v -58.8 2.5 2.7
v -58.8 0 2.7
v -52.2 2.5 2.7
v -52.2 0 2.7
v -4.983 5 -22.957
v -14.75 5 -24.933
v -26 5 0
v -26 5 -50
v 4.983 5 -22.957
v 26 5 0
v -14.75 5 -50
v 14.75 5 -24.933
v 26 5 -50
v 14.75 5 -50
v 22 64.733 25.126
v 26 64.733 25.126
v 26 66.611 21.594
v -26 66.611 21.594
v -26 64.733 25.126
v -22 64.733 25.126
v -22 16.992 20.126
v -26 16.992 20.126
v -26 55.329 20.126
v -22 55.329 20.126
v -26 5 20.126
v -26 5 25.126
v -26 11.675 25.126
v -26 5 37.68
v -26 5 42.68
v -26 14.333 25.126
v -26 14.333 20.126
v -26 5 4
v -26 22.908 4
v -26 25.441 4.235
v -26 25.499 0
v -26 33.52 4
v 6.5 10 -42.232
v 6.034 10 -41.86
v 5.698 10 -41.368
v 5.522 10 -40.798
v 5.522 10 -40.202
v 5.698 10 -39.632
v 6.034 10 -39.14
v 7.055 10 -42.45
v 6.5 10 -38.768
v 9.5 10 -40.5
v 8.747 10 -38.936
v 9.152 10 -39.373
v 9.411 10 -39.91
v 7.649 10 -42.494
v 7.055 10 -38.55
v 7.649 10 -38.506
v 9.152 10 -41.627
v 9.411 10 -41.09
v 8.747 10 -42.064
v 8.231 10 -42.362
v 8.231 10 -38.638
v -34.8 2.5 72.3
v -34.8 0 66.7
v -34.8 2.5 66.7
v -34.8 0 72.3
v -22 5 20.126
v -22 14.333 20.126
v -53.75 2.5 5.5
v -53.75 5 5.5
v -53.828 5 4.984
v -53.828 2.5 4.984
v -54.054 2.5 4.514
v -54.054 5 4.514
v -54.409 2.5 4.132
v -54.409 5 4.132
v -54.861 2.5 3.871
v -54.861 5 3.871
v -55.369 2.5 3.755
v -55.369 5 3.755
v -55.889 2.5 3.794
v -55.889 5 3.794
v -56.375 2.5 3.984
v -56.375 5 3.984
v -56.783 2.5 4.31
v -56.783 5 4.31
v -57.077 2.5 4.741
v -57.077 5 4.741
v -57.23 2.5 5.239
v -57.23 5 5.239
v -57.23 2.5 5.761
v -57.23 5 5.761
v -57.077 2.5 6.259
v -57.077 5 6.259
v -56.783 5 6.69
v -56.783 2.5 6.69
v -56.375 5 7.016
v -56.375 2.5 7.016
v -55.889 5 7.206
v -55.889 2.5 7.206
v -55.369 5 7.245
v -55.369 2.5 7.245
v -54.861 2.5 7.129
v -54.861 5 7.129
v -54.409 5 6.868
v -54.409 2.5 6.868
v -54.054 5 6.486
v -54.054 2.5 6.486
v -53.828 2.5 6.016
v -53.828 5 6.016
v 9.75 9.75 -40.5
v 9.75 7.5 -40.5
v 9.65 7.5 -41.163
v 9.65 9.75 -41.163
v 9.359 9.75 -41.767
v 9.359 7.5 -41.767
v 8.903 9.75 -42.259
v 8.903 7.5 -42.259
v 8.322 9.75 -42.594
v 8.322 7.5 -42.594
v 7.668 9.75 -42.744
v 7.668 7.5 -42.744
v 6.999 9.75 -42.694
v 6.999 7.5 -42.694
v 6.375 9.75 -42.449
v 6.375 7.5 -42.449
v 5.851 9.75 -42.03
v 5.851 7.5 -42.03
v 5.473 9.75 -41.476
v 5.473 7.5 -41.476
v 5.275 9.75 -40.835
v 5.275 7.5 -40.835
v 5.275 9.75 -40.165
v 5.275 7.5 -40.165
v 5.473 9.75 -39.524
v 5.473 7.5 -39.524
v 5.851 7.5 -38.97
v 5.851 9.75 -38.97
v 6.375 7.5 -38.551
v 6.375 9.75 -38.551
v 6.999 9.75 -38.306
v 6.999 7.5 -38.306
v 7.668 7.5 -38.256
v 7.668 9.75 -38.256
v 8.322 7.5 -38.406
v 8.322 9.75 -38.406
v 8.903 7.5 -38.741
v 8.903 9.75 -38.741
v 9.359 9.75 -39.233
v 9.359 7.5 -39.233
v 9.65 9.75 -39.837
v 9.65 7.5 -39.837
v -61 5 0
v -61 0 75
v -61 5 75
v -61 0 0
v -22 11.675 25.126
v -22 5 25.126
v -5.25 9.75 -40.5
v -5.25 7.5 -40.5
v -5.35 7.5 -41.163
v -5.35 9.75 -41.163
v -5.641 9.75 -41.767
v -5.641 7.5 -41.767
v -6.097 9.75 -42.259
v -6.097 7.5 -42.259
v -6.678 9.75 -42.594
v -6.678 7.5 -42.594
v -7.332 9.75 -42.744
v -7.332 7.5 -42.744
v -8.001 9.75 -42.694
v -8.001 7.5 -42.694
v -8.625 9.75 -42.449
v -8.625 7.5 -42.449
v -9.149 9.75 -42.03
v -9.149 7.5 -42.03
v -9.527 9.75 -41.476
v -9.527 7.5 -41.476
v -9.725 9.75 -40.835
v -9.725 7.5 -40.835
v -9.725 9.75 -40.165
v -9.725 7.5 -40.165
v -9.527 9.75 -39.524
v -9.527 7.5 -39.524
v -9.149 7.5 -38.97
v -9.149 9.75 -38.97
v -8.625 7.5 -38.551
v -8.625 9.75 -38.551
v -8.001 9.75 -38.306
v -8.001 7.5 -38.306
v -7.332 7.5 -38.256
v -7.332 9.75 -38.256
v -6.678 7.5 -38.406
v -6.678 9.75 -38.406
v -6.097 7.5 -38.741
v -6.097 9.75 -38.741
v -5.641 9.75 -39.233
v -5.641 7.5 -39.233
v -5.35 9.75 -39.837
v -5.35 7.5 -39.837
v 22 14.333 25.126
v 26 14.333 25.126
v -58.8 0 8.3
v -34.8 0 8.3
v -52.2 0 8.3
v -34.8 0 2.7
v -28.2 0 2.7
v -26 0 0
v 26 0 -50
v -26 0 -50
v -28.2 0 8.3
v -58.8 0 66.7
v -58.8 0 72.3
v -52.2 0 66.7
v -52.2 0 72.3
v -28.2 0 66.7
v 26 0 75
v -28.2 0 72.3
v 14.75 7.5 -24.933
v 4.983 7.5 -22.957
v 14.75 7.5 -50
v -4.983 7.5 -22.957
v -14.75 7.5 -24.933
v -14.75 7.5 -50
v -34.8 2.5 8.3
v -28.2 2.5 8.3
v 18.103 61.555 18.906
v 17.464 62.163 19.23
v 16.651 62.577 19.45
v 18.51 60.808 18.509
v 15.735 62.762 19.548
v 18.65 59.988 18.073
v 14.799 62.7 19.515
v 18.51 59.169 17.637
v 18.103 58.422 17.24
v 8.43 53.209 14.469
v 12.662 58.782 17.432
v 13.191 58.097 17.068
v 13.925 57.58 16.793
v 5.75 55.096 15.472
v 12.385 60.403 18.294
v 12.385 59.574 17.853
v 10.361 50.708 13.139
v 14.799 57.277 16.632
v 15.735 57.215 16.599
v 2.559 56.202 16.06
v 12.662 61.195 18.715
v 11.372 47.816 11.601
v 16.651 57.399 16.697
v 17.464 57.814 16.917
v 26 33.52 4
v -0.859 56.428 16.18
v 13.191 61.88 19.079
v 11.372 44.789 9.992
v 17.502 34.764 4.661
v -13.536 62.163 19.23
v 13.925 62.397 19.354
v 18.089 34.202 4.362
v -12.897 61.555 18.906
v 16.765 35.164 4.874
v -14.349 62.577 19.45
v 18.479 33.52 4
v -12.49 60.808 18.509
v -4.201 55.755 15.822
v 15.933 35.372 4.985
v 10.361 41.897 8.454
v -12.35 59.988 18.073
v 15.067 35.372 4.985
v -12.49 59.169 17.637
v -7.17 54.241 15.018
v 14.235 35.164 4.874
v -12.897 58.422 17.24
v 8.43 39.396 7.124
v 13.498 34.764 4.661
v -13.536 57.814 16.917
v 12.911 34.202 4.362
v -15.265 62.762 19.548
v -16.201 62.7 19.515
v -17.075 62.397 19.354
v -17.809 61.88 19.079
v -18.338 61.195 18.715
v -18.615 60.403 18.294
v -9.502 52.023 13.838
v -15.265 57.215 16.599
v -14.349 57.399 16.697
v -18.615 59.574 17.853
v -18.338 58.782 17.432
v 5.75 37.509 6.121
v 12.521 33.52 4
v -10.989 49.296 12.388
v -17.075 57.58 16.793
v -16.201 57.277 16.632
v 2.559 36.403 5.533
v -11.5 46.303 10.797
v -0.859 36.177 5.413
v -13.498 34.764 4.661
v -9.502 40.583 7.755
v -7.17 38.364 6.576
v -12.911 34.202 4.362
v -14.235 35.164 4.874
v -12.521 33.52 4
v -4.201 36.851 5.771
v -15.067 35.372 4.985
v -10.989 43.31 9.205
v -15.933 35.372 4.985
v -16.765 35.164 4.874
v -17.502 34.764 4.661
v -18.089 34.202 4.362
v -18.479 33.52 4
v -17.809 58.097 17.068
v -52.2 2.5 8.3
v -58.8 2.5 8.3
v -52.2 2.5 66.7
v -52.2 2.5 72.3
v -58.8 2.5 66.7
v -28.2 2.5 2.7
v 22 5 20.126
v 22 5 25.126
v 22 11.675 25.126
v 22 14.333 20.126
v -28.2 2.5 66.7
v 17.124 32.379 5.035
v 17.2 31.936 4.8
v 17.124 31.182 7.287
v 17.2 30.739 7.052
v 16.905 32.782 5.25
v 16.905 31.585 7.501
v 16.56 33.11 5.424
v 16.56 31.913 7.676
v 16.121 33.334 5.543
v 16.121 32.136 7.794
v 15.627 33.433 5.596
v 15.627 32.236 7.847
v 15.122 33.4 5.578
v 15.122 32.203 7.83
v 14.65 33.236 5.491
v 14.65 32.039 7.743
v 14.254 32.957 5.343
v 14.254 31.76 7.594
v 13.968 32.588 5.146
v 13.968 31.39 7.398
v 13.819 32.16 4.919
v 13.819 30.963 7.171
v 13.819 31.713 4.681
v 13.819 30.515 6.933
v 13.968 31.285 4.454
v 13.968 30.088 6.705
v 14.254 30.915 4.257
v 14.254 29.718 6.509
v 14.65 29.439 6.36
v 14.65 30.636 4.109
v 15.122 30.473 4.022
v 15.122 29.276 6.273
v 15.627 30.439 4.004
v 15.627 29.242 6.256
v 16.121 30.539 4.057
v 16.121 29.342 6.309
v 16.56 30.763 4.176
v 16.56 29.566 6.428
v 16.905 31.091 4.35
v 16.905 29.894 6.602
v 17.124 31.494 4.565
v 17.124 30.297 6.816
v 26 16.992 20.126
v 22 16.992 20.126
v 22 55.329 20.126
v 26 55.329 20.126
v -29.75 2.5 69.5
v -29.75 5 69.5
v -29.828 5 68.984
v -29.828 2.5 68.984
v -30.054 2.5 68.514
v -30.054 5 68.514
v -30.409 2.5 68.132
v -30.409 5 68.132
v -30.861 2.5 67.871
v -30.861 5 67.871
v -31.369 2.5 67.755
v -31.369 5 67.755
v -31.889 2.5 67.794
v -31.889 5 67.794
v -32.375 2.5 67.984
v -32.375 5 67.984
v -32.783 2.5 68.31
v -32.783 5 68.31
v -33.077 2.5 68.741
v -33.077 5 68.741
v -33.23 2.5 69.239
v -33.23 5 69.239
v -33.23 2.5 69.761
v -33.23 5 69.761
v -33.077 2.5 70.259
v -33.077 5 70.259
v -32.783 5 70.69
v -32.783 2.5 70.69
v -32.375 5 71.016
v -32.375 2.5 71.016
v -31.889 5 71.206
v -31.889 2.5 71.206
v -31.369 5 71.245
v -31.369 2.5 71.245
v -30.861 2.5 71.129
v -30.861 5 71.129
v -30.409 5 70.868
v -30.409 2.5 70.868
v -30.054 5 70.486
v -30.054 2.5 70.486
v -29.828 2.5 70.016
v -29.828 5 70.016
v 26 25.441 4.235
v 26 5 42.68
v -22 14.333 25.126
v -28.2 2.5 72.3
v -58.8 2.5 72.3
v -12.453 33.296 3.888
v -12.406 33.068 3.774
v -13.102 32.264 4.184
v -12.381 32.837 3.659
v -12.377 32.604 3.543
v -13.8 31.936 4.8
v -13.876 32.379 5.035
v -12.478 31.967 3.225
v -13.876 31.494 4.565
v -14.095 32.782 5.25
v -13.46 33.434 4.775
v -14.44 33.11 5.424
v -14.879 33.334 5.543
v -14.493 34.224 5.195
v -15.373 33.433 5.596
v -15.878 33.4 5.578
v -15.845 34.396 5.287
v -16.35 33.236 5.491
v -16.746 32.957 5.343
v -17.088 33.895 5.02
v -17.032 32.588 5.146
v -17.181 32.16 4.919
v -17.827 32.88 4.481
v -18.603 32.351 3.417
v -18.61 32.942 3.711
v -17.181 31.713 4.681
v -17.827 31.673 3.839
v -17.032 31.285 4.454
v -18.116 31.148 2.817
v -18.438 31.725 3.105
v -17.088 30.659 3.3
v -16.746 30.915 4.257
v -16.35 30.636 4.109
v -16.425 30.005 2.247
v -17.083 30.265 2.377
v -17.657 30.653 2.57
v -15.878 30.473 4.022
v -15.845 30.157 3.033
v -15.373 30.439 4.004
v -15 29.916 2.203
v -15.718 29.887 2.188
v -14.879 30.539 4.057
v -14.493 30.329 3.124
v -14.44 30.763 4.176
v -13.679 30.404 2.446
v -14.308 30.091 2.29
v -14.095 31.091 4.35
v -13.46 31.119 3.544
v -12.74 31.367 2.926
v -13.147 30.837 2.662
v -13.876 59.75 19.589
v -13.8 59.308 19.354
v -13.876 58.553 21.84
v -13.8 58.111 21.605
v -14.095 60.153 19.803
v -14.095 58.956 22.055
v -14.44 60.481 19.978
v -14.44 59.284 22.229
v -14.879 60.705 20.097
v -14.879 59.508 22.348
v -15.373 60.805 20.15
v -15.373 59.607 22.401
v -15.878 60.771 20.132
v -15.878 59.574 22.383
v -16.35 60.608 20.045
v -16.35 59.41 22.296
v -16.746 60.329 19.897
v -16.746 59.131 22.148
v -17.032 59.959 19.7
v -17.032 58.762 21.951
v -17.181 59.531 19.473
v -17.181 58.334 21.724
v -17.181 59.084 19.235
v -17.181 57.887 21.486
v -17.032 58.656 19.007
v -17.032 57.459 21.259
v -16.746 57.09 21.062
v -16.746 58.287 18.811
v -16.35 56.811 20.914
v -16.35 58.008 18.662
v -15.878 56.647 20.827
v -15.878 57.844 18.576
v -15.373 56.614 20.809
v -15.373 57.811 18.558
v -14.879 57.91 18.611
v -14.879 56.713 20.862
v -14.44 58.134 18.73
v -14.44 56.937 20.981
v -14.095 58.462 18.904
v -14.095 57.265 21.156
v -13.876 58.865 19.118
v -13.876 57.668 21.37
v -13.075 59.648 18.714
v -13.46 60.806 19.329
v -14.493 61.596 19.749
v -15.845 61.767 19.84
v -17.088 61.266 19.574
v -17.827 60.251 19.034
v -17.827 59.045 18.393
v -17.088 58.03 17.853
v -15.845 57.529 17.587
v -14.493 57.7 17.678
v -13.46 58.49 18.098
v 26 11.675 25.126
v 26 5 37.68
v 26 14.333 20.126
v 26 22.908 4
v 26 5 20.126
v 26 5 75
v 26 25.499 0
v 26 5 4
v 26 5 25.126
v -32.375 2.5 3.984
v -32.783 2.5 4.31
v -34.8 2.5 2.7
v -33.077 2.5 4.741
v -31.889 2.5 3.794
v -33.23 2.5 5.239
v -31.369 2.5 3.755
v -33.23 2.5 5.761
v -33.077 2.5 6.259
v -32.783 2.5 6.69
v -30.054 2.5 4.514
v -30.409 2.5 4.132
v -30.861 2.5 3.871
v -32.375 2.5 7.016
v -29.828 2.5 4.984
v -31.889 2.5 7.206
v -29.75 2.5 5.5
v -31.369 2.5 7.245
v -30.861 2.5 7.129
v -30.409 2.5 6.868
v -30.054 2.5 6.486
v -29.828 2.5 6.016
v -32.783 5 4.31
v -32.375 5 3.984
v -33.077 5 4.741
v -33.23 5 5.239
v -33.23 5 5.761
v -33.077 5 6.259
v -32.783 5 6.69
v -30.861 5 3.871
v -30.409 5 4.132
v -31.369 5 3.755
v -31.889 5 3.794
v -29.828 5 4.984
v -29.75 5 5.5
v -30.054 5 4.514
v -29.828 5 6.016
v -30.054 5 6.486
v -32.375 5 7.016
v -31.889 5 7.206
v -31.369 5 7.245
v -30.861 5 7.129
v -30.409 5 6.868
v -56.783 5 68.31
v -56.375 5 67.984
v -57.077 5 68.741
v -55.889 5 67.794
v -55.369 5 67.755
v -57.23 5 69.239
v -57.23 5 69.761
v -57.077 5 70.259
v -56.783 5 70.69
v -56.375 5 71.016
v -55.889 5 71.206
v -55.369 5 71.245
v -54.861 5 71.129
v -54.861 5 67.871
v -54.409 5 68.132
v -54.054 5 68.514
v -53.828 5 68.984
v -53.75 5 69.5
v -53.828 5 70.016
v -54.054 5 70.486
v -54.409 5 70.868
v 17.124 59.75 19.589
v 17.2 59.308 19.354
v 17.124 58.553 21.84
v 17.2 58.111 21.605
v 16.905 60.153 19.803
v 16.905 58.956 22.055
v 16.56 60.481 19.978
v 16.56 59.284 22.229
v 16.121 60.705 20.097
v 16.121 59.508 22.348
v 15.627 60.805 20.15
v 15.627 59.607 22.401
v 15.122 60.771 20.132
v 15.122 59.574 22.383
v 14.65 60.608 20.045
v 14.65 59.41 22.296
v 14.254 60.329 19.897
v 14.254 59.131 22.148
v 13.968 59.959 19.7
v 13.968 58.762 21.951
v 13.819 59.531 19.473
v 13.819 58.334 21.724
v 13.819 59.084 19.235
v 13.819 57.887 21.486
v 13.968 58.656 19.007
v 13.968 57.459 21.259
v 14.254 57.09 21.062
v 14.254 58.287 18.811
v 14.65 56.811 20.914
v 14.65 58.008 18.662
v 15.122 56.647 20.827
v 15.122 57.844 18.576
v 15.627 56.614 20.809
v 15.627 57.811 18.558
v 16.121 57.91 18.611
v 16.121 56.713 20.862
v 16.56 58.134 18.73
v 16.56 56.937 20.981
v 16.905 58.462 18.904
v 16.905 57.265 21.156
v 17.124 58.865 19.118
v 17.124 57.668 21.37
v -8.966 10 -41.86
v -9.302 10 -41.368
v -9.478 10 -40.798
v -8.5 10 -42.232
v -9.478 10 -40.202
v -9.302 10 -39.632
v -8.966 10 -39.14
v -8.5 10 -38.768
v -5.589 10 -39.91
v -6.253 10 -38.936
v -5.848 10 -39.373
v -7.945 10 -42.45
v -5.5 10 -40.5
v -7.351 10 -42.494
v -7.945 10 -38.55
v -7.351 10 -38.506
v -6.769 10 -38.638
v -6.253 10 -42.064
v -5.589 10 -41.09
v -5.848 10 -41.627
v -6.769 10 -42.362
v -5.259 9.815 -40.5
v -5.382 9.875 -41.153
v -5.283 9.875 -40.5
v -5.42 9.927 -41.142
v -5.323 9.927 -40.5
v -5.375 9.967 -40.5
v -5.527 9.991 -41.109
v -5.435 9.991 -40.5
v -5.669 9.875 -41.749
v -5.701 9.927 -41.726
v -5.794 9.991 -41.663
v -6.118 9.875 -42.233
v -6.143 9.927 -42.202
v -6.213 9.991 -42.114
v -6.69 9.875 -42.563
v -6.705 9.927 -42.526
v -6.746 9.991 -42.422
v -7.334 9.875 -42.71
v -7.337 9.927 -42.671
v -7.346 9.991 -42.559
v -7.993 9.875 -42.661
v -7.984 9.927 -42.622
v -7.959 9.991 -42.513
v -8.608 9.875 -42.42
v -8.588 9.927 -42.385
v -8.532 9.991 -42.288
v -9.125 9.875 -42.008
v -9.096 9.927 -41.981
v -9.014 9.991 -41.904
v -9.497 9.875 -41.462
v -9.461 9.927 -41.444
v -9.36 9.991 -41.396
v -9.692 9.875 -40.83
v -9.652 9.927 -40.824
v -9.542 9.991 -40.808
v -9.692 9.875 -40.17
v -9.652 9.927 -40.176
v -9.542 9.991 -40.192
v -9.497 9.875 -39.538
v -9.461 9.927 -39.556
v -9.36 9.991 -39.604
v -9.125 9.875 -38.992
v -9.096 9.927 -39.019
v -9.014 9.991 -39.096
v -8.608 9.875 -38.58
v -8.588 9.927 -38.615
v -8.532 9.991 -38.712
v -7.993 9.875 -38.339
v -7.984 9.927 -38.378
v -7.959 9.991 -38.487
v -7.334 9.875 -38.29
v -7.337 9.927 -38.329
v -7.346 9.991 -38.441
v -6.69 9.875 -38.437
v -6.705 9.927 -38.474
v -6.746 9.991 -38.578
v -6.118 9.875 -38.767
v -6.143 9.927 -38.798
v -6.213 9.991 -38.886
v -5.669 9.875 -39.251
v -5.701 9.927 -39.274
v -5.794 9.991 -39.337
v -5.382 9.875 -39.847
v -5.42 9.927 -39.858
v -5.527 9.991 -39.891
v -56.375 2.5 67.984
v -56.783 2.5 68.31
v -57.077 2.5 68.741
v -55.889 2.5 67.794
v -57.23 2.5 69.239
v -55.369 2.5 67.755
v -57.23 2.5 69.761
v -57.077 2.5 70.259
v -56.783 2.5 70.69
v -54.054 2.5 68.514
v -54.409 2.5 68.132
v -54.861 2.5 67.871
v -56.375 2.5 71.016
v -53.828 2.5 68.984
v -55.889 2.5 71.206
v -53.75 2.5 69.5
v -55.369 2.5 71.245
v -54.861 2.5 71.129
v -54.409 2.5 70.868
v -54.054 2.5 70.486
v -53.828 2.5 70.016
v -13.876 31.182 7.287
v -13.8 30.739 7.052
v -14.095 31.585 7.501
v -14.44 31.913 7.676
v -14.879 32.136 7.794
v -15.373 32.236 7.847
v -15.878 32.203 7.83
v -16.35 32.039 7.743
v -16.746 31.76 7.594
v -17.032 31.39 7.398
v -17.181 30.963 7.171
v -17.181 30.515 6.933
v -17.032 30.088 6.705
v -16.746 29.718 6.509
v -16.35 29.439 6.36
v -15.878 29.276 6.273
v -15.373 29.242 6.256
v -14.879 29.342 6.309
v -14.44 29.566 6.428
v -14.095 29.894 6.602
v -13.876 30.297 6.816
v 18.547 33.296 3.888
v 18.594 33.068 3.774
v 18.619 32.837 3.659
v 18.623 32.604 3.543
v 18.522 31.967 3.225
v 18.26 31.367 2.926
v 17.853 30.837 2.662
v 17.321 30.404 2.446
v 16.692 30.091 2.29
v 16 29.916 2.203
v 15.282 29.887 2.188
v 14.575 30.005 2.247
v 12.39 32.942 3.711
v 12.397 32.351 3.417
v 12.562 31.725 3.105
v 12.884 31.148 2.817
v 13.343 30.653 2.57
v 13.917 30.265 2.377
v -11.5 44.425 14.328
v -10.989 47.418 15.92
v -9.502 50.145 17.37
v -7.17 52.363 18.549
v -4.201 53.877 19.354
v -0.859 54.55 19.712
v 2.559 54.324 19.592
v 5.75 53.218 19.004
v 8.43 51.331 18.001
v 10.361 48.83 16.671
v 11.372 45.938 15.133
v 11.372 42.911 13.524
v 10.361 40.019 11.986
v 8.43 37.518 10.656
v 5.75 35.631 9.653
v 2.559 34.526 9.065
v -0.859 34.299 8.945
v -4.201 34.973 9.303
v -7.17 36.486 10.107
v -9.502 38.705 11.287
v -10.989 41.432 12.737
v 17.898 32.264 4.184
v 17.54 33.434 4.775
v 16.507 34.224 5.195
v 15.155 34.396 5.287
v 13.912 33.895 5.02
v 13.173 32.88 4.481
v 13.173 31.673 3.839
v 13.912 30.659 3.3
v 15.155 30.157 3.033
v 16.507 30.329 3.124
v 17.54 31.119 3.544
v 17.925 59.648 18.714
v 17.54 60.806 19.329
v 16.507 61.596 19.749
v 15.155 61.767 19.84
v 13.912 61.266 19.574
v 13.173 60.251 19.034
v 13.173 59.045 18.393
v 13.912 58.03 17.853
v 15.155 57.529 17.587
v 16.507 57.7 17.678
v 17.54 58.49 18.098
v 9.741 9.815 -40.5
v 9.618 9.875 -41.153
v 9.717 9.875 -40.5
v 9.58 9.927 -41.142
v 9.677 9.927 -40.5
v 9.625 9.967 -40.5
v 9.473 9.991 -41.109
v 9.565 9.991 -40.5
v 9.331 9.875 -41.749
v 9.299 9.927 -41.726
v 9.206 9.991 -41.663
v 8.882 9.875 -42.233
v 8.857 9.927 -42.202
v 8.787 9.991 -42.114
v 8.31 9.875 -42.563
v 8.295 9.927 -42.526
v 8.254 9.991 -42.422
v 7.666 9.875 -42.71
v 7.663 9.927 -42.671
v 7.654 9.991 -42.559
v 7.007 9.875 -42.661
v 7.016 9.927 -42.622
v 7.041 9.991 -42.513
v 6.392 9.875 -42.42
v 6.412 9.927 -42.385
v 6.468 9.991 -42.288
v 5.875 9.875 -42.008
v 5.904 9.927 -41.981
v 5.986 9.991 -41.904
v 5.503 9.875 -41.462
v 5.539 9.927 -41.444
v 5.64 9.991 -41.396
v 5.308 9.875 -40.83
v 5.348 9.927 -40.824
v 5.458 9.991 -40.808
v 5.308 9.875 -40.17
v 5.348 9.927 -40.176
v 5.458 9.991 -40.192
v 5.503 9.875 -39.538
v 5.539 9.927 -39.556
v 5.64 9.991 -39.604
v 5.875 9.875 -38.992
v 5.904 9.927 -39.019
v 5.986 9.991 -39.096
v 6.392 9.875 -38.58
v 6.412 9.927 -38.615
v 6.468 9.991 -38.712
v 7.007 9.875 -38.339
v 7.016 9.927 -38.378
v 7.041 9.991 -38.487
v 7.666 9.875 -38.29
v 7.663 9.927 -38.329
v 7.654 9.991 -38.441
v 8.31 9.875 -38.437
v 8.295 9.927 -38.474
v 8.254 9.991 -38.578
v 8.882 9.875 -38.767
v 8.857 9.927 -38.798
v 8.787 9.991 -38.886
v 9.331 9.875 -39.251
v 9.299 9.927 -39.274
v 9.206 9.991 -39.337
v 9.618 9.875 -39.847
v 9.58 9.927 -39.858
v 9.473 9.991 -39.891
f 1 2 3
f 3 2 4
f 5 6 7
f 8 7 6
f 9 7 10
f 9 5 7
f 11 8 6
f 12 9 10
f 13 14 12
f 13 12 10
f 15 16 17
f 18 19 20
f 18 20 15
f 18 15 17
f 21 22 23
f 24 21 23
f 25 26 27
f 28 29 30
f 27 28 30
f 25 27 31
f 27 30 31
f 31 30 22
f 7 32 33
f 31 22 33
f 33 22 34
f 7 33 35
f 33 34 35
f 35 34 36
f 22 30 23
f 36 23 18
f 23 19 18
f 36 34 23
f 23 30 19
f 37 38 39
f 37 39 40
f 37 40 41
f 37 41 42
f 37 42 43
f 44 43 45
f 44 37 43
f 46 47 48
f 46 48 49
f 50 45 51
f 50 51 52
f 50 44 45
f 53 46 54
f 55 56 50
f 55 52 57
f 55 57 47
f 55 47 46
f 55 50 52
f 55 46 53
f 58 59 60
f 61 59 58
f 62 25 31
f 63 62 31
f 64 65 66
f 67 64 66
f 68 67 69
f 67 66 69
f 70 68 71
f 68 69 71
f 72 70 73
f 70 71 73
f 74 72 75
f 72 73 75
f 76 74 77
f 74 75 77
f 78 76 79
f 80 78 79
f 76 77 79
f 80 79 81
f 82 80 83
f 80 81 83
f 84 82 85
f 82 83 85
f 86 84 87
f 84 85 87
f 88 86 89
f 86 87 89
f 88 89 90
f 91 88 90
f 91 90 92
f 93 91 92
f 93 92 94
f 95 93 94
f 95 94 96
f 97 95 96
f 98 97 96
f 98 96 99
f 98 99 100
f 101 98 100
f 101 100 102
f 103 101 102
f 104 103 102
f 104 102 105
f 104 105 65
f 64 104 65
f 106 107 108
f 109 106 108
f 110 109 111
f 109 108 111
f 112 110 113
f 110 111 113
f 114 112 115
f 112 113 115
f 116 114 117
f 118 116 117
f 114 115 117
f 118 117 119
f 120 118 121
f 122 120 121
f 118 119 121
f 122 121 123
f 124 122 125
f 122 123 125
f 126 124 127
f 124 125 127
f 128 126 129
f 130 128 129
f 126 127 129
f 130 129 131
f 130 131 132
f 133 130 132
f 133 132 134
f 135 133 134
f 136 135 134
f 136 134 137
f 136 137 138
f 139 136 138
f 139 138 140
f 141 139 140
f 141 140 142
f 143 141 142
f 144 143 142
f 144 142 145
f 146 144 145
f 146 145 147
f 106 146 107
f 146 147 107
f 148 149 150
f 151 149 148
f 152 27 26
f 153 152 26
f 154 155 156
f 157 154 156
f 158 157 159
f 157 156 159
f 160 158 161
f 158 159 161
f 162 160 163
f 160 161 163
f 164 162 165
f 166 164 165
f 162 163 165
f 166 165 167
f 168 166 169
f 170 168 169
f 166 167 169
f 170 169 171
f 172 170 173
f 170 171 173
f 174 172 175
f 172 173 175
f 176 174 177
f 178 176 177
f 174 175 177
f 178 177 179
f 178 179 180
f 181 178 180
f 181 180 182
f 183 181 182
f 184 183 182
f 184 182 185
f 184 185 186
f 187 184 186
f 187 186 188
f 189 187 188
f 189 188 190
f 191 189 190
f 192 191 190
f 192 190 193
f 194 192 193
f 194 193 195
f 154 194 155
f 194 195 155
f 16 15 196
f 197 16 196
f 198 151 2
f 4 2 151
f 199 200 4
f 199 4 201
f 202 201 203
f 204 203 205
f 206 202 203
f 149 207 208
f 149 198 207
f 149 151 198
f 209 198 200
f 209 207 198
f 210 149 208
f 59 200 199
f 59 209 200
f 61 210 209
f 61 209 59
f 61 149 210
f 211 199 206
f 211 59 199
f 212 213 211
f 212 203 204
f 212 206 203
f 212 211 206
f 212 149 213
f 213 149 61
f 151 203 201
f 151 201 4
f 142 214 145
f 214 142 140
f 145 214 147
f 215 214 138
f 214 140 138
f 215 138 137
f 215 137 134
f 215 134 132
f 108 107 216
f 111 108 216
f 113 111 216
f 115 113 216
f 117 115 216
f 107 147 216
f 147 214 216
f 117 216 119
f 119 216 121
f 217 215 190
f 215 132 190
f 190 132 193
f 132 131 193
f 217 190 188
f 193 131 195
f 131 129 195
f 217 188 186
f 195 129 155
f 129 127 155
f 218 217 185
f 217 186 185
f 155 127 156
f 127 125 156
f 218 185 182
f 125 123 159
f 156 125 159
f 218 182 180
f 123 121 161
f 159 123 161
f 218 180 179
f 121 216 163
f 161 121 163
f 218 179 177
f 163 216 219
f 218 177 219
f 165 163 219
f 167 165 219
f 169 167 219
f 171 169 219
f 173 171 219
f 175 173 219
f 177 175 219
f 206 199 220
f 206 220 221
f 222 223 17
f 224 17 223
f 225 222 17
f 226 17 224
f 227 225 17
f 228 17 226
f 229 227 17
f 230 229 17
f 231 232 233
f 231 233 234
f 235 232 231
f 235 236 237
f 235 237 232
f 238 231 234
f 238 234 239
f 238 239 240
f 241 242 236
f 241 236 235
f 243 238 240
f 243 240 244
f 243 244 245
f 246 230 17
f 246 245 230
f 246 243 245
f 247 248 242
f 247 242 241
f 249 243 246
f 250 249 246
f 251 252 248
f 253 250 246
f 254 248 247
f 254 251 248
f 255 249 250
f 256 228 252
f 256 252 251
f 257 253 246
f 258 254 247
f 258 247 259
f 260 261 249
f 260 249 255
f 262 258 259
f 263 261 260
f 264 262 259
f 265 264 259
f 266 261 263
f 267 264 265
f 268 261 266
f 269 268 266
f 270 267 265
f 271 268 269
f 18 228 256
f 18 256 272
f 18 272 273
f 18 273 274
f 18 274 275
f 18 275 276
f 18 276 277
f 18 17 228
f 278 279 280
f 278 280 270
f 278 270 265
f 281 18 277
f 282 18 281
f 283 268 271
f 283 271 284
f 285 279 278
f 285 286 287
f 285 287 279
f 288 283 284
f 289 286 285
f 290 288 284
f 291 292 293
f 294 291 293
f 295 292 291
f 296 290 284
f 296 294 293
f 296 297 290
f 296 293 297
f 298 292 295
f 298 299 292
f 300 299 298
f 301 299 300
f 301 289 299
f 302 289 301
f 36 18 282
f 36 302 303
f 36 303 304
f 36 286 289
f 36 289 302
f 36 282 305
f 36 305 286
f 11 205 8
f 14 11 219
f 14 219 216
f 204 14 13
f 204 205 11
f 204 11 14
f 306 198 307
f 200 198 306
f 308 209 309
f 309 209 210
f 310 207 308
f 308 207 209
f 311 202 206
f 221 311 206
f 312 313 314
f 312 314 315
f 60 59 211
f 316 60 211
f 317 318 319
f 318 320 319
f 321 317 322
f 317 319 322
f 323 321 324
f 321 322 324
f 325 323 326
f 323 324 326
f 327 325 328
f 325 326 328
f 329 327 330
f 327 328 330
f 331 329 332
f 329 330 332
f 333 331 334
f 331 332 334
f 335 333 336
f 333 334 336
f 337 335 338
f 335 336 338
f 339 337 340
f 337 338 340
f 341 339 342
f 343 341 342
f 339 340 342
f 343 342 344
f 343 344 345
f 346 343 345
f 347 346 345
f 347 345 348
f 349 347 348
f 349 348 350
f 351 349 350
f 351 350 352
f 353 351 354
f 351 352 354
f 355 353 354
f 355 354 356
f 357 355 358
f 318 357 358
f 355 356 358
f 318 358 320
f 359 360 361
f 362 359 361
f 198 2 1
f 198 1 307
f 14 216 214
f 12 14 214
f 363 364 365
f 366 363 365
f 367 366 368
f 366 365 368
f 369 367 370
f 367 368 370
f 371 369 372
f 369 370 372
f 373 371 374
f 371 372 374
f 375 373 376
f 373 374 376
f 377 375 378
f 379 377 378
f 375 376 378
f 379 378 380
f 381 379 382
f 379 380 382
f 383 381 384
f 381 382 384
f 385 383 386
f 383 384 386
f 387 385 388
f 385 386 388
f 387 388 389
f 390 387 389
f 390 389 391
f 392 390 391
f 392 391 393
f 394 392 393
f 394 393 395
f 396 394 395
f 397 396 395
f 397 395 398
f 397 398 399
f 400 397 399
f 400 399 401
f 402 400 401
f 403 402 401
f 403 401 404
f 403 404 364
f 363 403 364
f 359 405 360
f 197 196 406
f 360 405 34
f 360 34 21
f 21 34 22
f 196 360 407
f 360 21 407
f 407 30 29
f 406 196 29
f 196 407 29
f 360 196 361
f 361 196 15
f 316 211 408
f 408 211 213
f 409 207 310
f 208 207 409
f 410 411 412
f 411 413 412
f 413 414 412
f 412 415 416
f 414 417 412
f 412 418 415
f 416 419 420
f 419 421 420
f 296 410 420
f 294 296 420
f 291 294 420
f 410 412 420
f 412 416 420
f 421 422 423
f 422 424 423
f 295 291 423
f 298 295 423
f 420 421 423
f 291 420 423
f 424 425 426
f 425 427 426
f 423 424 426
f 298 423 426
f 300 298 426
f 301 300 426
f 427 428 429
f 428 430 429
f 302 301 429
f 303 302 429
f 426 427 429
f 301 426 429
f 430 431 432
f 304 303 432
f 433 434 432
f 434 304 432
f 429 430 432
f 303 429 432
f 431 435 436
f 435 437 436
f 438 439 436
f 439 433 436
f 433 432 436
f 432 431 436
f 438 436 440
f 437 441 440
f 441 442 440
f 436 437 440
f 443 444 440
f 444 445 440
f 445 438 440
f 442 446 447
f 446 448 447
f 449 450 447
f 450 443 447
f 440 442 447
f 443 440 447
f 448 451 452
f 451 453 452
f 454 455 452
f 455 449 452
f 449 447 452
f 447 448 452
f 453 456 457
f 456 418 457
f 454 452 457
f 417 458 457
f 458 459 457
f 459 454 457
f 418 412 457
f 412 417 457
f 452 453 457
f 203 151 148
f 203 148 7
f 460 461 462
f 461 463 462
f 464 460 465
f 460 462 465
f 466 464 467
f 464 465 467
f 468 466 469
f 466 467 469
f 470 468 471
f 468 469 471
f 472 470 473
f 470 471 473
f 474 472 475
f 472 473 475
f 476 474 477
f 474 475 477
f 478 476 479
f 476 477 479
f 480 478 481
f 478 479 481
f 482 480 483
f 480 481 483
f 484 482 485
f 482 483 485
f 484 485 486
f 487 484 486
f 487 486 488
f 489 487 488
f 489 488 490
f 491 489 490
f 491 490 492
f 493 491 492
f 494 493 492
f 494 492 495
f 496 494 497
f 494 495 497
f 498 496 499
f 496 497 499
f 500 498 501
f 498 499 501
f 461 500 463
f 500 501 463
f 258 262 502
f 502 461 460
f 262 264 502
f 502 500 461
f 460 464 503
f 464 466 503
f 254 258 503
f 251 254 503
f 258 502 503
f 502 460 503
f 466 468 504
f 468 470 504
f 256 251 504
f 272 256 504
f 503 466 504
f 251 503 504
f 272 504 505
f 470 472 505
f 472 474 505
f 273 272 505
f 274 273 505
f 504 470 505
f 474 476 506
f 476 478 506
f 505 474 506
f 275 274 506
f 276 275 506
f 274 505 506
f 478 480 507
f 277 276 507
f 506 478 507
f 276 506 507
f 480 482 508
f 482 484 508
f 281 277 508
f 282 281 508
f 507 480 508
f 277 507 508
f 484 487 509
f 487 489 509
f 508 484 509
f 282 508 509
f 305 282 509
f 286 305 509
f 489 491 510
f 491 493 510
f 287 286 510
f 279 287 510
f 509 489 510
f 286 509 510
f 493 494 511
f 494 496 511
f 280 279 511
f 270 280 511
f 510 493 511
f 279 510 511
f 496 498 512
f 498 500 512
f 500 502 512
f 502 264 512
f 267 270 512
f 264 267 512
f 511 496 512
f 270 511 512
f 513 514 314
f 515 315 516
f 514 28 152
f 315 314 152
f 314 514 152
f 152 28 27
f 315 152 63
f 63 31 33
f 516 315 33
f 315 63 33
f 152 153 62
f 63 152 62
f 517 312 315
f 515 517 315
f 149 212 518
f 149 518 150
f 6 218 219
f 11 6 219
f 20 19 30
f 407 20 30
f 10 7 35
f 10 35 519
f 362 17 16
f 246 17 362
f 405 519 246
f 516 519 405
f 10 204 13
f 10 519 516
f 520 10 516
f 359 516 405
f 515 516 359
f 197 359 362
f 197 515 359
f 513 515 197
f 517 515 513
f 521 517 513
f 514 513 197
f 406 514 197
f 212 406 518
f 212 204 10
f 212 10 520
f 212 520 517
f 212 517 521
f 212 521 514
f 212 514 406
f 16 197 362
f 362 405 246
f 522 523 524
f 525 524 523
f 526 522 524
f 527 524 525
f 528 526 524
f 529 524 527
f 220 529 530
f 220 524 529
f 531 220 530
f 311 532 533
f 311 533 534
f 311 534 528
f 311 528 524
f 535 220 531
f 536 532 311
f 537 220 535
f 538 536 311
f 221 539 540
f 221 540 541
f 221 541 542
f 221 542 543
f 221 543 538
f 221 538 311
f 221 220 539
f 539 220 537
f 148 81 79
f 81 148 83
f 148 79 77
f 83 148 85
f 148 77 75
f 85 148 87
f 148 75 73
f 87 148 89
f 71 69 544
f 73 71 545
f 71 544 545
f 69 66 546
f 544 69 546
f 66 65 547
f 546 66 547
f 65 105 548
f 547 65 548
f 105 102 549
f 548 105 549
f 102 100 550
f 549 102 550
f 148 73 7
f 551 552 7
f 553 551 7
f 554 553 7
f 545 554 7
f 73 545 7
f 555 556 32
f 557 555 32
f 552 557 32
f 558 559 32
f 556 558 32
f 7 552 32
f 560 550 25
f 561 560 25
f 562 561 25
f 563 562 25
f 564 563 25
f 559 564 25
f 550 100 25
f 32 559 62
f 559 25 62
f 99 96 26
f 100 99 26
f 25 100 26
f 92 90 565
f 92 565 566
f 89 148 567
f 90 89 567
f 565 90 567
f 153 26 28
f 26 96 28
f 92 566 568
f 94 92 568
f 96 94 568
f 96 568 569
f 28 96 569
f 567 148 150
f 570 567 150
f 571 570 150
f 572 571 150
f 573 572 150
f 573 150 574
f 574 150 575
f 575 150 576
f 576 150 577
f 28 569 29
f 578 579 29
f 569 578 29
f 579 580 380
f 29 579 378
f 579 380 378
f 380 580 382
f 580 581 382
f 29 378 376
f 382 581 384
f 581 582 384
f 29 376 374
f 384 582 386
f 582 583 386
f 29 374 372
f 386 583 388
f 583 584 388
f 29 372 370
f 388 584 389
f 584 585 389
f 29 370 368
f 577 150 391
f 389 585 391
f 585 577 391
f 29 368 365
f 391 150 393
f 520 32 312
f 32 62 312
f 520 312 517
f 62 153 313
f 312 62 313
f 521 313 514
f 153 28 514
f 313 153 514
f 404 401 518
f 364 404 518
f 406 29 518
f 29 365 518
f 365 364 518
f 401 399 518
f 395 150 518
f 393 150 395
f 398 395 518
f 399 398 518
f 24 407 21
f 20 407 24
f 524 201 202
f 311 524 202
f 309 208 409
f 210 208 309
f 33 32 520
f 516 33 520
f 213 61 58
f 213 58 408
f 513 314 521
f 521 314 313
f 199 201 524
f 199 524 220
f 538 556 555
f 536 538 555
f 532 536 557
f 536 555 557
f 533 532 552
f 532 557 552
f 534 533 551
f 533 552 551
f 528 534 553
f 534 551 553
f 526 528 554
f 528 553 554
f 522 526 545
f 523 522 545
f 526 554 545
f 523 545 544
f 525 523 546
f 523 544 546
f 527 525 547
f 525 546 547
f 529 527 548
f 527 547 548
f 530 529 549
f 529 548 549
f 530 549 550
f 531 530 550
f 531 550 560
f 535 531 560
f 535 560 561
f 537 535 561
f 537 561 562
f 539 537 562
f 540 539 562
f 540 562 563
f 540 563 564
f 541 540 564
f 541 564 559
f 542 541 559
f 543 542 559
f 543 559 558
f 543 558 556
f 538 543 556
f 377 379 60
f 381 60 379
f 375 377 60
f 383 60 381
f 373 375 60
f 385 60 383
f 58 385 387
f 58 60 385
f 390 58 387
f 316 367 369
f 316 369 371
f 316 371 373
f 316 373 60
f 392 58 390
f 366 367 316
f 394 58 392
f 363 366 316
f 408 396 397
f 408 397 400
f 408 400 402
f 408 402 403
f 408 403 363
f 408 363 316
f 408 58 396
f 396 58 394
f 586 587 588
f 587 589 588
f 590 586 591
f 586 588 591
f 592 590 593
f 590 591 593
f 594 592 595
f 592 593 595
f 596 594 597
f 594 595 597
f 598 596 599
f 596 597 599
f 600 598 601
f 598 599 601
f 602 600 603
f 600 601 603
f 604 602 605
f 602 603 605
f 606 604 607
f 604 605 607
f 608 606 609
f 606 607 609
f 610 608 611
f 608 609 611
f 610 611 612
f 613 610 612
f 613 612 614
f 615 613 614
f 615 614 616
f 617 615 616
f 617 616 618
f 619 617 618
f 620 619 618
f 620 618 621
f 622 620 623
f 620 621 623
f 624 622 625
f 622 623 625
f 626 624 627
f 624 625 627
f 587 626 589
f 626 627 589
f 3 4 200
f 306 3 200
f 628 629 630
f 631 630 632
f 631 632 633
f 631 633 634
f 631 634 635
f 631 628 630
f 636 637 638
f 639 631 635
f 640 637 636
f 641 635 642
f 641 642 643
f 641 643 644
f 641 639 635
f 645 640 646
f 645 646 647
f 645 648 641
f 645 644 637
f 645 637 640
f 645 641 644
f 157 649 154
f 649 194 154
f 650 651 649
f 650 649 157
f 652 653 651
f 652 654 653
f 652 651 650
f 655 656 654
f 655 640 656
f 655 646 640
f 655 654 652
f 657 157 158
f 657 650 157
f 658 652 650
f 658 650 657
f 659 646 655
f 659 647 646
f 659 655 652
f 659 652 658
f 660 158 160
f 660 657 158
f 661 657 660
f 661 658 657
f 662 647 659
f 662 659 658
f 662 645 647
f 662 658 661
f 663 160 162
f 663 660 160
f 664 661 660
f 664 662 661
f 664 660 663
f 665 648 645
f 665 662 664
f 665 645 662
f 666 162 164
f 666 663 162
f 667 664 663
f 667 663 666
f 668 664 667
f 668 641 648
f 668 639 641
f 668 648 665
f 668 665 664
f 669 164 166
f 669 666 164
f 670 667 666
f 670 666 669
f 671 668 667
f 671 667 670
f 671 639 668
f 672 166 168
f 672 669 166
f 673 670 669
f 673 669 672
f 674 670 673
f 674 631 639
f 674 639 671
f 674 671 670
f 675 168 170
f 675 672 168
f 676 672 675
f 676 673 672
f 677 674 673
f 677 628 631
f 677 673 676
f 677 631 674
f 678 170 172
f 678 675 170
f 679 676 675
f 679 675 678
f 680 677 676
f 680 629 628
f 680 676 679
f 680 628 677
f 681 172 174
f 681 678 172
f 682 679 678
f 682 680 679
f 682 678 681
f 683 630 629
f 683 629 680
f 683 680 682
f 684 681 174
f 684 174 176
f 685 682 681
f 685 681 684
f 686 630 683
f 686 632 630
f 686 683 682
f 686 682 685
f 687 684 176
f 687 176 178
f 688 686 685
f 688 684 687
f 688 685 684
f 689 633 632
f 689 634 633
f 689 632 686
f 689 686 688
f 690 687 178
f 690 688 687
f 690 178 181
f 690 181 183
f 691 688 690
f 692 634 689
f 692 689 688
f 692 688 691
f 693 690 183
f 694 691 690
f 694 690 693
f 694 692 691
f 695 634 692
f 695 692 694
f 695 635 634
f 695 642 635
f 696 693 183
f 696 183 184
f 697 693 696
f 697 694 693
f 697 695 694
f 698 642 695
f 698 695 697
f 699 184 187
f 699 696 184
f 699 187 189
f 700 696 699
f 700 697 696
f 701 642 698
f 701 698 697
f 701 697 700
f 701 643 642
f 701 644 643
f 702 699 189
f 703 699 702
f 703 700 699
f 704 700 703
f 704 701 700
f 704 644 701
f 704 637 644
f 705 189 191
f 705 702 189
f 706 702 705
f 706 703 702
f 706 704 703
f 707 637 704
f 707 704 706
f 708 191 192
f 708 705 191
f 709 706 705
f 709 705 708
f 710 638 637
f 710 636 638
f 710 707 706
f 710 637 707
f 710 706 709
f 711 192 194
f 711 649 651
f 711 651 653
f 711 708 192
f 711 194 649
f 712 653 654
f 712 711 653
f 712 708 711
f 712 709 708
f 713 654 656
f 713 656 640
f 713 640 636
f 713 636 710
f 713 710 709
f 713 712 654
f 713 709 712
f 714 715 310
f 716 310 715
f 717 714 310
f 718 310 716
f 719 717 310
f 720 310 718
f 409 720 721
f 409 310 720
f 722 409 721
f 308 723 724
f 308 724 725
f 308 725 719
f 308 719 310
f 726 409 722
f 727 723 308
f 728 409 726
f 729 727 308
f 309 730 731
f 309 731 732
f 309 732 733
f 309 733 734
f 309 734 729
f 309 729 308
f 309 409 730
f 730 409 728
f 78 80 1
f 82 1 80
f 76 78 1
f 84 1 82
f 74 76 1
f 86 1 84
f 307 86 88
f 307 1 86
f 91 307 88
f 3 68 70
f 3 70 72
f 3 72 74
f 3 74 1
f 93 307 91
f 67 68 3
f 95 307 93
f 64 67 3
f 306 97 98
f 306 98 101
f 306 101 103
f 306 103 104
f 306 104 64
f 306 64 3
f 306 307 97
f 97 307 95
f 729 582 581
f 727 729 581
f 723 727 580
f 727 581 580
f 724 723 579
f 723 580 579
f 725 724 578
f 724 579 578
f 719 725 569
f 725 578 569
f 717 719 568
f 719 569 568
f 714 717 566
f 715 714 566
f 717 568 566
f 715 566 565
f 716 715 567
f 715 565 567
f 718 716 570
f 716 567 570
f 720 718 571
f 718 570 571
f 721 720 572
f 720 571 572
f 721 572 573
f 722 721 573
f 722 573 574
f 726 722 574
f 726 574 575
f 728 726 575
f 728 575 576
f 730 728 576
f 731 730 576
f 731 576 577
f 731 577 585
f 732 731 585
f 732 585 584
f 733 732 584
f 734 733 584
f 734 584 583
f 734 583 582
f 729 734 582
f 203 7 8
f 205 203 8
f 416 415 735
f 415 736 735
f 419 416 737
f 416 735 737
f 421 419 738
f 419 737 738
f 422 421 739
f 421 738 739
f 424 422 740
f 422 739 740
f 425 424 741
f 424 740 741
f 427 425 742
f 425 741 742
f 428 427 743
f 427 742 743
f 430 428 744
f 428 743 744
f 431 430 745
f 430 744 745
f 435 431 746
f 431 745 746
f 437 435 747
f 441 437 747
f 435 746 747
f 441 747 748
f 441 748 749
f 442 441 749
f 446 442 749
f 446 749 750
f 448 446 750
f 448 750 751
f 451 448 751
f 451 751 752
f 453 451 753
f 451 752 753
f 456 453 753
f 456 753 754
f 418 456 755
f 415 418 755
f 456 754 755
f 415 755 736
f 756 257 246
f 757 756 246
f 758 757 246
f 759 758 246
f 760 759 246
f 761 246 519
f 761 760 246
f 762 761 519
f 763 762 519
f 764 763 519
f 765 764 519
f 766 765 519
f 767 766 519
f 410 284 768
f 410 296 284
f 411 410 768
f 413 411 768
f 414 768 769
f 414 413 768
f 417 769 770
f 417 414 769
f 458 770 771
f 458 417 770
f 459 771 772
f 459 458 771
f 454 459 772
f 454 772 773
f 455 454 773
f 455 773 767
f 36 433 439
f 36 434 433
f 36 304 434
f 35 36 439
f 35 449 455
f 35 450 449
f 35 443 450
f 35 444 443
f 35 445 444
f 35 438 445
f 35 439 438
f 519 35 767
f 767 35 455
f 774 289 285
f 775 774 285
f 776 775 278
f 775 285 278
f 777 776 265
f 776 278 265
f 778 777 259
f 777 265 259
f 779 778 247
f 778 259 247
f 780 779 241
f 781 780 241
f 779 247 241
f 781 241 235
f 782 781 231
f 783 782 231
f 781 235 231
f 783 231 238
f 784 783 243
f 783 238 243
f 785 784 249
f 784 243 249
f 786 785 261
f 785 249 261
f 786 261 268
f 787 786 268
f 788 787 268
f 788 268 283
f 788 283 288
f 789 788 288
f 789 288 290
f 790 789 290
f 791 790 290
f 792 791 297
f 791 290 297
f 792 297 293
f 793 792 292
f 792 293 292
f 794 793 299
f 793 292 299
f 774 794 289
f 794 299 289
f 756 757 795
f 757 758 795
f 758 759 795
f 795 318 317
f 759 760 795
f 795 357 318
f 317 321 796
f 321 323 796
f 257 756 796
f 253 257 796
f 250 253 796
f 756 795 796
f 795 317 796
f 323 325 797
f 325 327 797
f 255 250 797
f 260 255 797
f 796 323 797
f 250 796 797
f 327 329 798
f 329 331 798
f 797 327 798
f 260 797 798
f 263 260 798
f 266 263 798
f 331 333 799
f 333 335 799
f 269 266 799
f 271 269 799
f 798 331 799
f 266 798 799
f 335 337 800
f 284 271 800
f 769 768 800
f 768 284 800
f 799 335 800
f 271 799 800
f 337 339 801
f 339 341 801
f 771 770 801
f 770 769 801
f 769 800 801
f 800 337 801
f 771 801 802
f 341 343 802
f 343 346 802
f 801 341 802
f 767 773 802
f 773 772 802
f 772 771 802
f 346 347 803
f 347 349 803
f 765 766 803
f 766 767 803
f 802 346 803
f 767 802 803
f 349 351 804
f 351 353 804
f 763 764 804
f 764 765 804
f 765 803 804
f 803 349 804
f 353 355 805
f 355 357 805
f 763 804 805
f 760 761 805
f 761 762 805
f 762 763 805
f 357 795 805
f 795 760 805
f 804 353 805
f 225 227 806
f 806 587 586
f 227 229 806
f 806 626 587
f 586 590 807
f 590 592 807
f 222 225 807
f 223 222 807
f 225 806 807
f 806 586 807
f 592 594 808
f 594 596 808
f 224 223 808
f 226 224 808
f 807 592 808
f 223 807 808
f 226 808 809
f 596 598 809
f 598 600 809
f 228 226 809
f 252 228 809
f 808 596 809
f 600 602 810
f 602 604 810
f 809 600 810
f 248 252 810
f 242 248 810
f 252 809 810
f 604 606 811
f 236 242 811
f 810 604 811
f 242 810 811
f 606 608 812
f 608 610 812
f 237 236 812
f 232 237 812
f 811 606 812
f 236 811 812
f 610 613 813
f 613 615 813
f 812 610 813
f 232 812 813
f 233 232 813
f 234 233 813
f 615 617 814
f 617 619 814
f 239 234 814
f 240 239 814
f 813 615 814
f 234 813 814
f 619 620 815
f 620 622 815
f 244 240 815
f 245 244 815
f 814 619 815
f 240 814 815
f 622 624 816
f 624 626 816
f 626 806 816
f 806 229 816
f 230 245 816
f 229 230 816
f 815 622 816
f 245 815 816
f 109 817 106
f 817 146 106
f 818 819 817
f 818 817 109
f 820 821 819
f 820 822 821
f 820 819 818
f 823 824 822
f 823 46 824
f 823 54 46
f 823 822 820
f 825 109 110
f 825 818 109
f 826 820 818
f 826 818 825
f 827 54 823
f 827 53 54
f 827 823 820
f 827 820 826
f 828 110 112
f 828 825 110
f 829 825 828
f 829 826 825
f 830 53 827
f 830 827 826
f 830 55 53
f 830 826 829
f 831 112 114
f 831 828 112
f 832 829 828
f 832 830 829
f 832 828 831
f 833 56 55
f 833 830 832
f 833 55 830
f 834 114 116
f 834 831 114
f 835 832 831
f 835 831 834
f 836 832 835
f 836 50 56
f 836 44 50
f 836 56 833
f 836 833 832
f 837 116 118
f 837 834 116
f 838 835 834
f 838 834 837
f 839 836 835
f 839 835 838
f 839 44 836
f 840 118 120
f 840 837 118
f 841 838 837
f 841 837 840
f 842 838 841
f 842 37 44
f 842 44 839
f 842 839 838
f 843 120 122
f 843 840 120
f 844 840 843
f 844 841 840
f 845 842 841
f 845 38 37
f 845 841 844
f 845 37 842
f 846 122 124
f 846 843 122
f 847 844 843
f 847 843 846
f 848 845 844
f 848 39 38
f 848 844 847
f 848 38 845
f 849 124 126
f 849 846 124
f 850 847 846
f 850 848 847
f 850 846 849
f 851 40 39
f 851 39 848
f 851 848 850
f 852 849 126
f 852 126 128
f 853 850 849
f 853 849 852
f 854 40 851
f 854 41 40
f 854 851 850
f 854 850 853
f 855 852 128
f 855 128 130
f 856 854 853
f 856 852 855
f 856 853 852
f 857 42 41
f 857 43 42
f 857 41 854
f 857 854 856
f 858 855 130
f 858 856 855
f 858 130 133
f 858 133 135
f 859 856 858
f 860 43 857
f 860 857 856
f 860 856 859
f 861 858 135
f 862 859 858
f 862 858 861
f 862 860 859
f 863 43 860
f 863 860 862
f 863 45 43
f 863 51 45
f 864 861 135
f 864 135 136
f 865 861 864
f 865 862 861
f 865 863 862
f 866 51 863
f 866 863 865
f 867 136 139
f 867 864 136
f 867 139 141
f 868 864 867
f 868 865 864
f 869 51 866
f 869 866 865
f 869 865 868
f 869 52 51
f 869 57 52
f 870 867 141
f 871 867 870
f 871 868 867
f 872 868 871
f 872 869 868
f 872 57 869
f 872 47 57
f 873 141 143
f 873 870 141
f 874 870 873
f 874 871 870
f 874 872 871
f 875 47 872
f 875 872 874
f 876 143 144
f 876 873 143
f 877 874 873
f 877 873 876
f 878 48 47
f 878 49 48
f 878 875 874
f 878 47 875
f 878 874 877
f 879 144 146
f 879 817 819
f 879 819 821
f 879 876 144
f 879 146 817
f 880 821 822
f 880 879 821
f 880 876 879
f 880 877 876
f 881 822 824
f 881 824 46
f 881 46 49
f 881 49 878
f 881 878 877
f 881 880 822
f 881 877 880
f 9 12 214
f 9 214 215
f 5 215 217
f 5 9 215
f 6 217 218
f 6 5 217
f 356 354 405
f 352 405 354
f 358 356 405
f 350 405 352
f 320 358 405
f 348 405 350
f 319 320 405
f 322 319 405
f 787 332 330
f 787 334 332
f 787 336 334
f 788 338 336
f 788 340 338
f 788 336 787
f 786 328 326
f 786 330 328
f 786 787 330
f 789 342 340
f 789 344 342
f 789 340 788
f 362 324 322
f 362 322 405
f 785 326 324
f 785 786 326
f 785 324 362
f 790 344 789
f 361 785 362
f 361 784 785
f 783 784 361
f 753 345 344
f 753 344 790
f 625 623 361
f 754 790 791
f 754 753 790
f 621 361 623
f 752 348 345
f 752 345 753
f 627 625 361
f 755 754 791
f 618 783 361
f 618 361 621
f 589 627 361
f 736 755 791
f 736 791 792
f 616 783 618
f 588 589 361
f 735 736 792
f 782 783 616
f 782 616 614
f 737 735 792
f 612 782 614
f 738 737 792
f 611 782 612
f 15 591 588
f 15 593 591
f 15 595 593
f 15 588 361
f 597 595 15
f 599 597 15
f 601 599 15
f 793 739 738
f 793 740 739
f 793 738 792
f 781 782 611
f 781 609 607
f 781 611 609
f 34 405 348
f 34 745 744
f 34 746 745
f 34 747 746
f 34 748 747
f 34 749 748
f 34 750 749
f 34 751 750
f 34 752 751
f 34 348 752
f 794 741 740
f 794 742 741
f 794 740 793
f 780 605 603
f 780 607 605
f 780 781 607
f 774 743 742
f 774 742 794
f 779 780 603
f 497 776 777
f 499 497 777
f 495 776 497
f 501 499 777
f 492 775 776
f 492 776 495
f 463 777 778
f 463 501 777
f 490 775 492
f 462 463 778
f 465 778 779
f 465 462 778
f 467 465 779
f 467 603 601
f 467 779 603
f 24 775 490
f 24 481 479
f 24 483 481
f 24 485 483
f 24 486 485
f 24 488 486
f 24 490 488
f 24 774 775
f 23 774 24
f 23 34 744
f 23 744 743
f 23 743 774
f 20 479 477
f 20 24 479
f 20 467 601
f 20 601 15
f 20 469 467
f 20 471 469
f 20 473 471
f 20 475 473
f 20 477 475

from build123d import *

# Parameters (mm, degrees)
SKETCH1_W                                           = 52
SKETCH1_H                                           = 100
BOSS_EXTRUDE1_DEPTH                                 = 5
BOSS_EXTRUDE3_DEPTH                                 = 2.5
SKETCH7_R                                           = 2.25
BOSS_EXTRUDE4_DEPTH                                 = 2.5
FILLET2_R                                           = 0.25
SKETCH9_W                                           = 52
SKETCH9_H                                           = 4
BOSS_EXTRUDE5_DEPTH                                 = 50
BOSS_EXTRUDE7_DEPTH                                 = 52
CUT_EXTRUDE3_DEPTH                                  = 52
CUT_EXTRUDE4_DEPTH                                  = 2.5
BOSS_EXTRUDE8_DEPTH                                 = 52
BOSS_EXTRUDE9_DEPTH                                 = 4
LPATTERN1_COUNT                                     = 2
LPATTERN1_PITCH                                     = 48
SKETCH18_R                                          = 11.5
CUT_EXTRUDE5_DEPTH                                  = 4
CSK_FOR_M3_COUNTERSUNK_FLAT_HEAD_SCREW1_D           = 3.4
CSK_FOR_M3_COUNTERSUNK_FLAT_HEAD_SCREW1_DEPTH       = 5
CSK_FOR_M3_COUNTERSUNK_FLAT_HEAD_SCREW1_CSINK_D     = 6.3
CSK_FOR_M3_COUNTERSUNK_FLAT_HEAD_SCREW1_CSINK_ANGLE = 90
CSK_FOR_M3_COUNTERSUNK_FLAT_HEAD_SCREW1_TIP         = 1.021463052
BOSS_EXTRUDE10_DEPTH                                = 5
SKETCH23_R                                          = 1.75
CUT_EXTRUDE6_DEPTH                                  = 5
SKETCH24_W                                          = 6.6
SKETCH24_H                                          = 5.6
CUT_EXTRUDE7_DEPTH                                  = 2.5


with BuildPart() as part:
    # Sketch1 → Boss-Extrude1 (new body)
    with BuildSketch(Plane(origin=(0, 0, 0), x_dir=(1, 0, 0), z_dir=(0, 1, 0))):
        Rectangle(SKETCH1_W, SKETCH1_H)
    extrude(amount=BOSS_EXTRUDE1_DEPTH)

    # Sketch2 → Boss-Extrude3 (add)
    with BuildSketch(Plane(origin=(0, 5, 0), x_dir=(1, 0, 0), z_dir=(0, 1, 0))):
        with BuildLine():
            Line((-26, 50), (26, 50))
            Line((26, 50), (26, 30))
            ThreePointArc((26, 30), (0, 22.708313008), (-26, 30))
            Line((-26, 30), (-26, 50))
        make_face()
    extrude(amount=BOSS_EXTRUDE3_DEPTH)

    # Sketch7 → Boss-Extrude4 (add)
    with BuildSketch(Plane(origin=(0, 7.5, 0), x_dir=(1, 0, 0), z_dir=(0, 1, 0))):
        with Locations((-7.5, 40.5)):
            Circle(SKETCH7_R)
        with Locations((7.5, 40.5)):
            Circle(SKETCH7_R)
    extrude(amount=BOSS_EXTRUDE4_DEPTH)

    # Fillet2
    fillet2_edges = [part.edges().sort_by_distance(p)[0] for p in [
        (-9.75, 10, -40.5),
        (5.25, 10, -40.5),
    ]]
    fillet(fillet2_edges, radius=FILLET2_R)

    # Sketch9 → Boss-Extrude5 (add)
    with BuildSketch(Plane(origin=(0, 5, 0), x_dir=(1, 0, 0), z_dir=(0, 1, 0))):
        with Locations((0, -2)):
            Rectangle(SKETCH9_W, SKETCH9_H)
    extrude(amount=BOSS_EXTRUDE5_DEPTH)

    # Sketch10 → Boss-Extrude7 (add)
    with BuildSketch(Plane.ZY.offset(26)):
        Polygon((4, 25), (25.126220325, 64.732641679), (21.594429954, 66.61052793), (4, 33.520217873), align=None)
    extrude(amount=-BOSS_EXTRUDE7_DEPTH)

    # Sketch11 → Cut-Extrude3 (cut)
    with BuildSketch(Plane.ZY.offset(26)):
        Polygon((4, 33.520217873), (0, 25.498656006), (0, 55), (4, 55), align=None)
    extrude(amount=-CUT_EXTRUDE3_DEPTH, mode=Mode.SUBTRACT)

    # Sketch13 → Cut-Extrude4 (cut)
    with BuildSketch(Plane(origin=(0, 7.5, 0), x_dir=(1, 0, 0), z_dir=(0, 1, 0))):
        with BuildLine():
            Line((-14.75, 24.933450371), (-14.75, 50))
            Line((-14.75, 50), (-26, 50))
            Line((-26, 50), (-26, 30))
            ThreePointArc((-26, 30), (-20.531880242, 27.118381074), (-14.75, 24.933450371))
        make_face()
        with BuildLine():
            Line((26, 50), (14.75, 50))
            Line((14.75, 50), (14.75, 24.933450371))
            ThreePointArc((14.75, 24.933450371), (20.531880242, 27.118381074), (26, 30))
            Line((26, 30), (26, 50))
        make_face()
    extrude(amount=-CUT_EXTRUDE4_DEPTH, mode=Mode.SUBTRACT)

    # Sketch16 → Boss-Extrude8 (add)
    with BuildSketch(Plane.ZY.offset(26)):
        Polygon((4.234735781, 25.441473796), (42.679556541, 5), (37.679556541, 5), (4, 22.907737867), (4, 25), align=None)
    extrude(amount=-BOSS_EXTRUDE8_DEPTH)

    # Sketch17 → Boss-Extrude9 (add)
    with BuildSketch(Plane.ZY.offset(26)):
        Polygon((25.126220325, 64.732641679), (25.126220325, 5), (20.126220325, 5), (20.126220325, 55.329009352), align=None)
    boss_extrude9 = extrude(amount=-BOSS_EXTRUDE9_DEPTH)

    # LPattern1: Boss-Extrude9 ×2
    with Locations(*[(i * LPATTERN1_PITCH, 0, 0) for i in range(1, LPATTERN1_COUNT)]):
        add(boss_extrude9)

    # Sketch18 → Cut-Extrude5 (cut)
    with BuildSketch(Plane(origin=(0, 5.729899813, -10.776374221), x_dir=(-1, 0, 0), z_dir=(0, 0.469471563, -0.882947593))):
        with Locations((0, 45.951576073)):
            Circle(SKETCH18_R)
    extrude(amount=-CUT_EXTRUDE5_DEPTH, mode=Mode.SUBTRACT)

    # CSK for M3 Countersunk Flat Head Screw1
    with Locations(Plane(origin=(0, 5.729899813, -10.776374221), x_dir=(-1, 0, 0), z_dir=(0, 0.469471563, -0.882947593))):
        with Locations((-15.5, 61.451576073), (15.5, 61.451576073), (15.5, 30.451576073), (-15.5, 30.451576073)):
            CounterSinkHole(CSK_FOR_M3_COUNTERSUNK_FLAT_HEAD_SCREW1_D / 2, CSK_FOR_M3_COUNTERSUNK_FLAT_HEAD_SCREW1_CSINK_D / 2, depth=CSK_FOR_M3_COUNTERSUNK_FLAT_HEAD_SCREW1_DEPTH, counter_sink_angle=CSK_FOR_M3_COUNTERSUNK_FLAT_HEAD_SCREW1_CSINK_ANGLE)
            with Locations((0, 0, -(CSK_FOR_M3_COUNTERSUNK_FLAT_HEAD_SCREW1_DEPTH + CSK_FOR_M3_COUNTERSUNK_FLAT_HEAD_SCREW1_TIP / 2))):  # 118° drill point
                Cone(0, CSK_FOR_M3_COUNTERSUNK_FLAT_HEAD_SCREW1_D / 2, CSK_FOR_M3_COUNTERSUNK_FLAT_HEAD_SCREW1_TIP, mode=Mode.SUBTRACT)

    # Sketch22 → Boss-Extrude10 (add)
    with BuildSketch(Plane.XZ):
        Polygon((26, 75), (-61, 75), (-61, 0), (-26, 0), (-26, 50), (26, 50), align=None)
    extrude(amount=-BOSS_EXTRUDE10_DEPTH)

    # Sketch23 → Cut-Extrude6 (cut)
    with BuildSketch(Plane(origin=(0, 5, 0), x_dir=(1, 0, 0), z_dir=(0, 1, 0))):
        with Locations((-31.5, -5.5)):
            Circle(SKETCH23_R)
        with Locations((-55.5, -5.5)):
            Circle(SKETCH23_R)
        with Locations((-55.5, -69.5)):
            Circle(SKETCH23_R)
        with Locations((-31.5, -69.5)):
            Circle(SKETCH23_R)
    extrude(amount=-CUT_EXTRUDE6_DEPTH, mode=Mode.SUBTRACT)

    # Sketch24 → Cut-Extrude7 (cut)
    with BuildSketch(Plane.XZ):
        with Locations((-31.5, 69.5)):
            Rectangle(SKETCH24_W, SKETCH24_H)
        with Locations((-55.5, 69.5)):
            Rectangle(SKETCH24_W, SKETCH24_H)
        with Locations((-31.5, 5.5)):
            Rectangle(SKETCH24_W, SKETCH24_H)
        with Locations((-55.5, 5.5)):
            Rectangle(SKETCH24_W, SKETCH24_H)
    extrude(amount=-CUT_EXTRUDE7_DEPTH, mode=Mode.SUBTRACT)


solid = part.part
